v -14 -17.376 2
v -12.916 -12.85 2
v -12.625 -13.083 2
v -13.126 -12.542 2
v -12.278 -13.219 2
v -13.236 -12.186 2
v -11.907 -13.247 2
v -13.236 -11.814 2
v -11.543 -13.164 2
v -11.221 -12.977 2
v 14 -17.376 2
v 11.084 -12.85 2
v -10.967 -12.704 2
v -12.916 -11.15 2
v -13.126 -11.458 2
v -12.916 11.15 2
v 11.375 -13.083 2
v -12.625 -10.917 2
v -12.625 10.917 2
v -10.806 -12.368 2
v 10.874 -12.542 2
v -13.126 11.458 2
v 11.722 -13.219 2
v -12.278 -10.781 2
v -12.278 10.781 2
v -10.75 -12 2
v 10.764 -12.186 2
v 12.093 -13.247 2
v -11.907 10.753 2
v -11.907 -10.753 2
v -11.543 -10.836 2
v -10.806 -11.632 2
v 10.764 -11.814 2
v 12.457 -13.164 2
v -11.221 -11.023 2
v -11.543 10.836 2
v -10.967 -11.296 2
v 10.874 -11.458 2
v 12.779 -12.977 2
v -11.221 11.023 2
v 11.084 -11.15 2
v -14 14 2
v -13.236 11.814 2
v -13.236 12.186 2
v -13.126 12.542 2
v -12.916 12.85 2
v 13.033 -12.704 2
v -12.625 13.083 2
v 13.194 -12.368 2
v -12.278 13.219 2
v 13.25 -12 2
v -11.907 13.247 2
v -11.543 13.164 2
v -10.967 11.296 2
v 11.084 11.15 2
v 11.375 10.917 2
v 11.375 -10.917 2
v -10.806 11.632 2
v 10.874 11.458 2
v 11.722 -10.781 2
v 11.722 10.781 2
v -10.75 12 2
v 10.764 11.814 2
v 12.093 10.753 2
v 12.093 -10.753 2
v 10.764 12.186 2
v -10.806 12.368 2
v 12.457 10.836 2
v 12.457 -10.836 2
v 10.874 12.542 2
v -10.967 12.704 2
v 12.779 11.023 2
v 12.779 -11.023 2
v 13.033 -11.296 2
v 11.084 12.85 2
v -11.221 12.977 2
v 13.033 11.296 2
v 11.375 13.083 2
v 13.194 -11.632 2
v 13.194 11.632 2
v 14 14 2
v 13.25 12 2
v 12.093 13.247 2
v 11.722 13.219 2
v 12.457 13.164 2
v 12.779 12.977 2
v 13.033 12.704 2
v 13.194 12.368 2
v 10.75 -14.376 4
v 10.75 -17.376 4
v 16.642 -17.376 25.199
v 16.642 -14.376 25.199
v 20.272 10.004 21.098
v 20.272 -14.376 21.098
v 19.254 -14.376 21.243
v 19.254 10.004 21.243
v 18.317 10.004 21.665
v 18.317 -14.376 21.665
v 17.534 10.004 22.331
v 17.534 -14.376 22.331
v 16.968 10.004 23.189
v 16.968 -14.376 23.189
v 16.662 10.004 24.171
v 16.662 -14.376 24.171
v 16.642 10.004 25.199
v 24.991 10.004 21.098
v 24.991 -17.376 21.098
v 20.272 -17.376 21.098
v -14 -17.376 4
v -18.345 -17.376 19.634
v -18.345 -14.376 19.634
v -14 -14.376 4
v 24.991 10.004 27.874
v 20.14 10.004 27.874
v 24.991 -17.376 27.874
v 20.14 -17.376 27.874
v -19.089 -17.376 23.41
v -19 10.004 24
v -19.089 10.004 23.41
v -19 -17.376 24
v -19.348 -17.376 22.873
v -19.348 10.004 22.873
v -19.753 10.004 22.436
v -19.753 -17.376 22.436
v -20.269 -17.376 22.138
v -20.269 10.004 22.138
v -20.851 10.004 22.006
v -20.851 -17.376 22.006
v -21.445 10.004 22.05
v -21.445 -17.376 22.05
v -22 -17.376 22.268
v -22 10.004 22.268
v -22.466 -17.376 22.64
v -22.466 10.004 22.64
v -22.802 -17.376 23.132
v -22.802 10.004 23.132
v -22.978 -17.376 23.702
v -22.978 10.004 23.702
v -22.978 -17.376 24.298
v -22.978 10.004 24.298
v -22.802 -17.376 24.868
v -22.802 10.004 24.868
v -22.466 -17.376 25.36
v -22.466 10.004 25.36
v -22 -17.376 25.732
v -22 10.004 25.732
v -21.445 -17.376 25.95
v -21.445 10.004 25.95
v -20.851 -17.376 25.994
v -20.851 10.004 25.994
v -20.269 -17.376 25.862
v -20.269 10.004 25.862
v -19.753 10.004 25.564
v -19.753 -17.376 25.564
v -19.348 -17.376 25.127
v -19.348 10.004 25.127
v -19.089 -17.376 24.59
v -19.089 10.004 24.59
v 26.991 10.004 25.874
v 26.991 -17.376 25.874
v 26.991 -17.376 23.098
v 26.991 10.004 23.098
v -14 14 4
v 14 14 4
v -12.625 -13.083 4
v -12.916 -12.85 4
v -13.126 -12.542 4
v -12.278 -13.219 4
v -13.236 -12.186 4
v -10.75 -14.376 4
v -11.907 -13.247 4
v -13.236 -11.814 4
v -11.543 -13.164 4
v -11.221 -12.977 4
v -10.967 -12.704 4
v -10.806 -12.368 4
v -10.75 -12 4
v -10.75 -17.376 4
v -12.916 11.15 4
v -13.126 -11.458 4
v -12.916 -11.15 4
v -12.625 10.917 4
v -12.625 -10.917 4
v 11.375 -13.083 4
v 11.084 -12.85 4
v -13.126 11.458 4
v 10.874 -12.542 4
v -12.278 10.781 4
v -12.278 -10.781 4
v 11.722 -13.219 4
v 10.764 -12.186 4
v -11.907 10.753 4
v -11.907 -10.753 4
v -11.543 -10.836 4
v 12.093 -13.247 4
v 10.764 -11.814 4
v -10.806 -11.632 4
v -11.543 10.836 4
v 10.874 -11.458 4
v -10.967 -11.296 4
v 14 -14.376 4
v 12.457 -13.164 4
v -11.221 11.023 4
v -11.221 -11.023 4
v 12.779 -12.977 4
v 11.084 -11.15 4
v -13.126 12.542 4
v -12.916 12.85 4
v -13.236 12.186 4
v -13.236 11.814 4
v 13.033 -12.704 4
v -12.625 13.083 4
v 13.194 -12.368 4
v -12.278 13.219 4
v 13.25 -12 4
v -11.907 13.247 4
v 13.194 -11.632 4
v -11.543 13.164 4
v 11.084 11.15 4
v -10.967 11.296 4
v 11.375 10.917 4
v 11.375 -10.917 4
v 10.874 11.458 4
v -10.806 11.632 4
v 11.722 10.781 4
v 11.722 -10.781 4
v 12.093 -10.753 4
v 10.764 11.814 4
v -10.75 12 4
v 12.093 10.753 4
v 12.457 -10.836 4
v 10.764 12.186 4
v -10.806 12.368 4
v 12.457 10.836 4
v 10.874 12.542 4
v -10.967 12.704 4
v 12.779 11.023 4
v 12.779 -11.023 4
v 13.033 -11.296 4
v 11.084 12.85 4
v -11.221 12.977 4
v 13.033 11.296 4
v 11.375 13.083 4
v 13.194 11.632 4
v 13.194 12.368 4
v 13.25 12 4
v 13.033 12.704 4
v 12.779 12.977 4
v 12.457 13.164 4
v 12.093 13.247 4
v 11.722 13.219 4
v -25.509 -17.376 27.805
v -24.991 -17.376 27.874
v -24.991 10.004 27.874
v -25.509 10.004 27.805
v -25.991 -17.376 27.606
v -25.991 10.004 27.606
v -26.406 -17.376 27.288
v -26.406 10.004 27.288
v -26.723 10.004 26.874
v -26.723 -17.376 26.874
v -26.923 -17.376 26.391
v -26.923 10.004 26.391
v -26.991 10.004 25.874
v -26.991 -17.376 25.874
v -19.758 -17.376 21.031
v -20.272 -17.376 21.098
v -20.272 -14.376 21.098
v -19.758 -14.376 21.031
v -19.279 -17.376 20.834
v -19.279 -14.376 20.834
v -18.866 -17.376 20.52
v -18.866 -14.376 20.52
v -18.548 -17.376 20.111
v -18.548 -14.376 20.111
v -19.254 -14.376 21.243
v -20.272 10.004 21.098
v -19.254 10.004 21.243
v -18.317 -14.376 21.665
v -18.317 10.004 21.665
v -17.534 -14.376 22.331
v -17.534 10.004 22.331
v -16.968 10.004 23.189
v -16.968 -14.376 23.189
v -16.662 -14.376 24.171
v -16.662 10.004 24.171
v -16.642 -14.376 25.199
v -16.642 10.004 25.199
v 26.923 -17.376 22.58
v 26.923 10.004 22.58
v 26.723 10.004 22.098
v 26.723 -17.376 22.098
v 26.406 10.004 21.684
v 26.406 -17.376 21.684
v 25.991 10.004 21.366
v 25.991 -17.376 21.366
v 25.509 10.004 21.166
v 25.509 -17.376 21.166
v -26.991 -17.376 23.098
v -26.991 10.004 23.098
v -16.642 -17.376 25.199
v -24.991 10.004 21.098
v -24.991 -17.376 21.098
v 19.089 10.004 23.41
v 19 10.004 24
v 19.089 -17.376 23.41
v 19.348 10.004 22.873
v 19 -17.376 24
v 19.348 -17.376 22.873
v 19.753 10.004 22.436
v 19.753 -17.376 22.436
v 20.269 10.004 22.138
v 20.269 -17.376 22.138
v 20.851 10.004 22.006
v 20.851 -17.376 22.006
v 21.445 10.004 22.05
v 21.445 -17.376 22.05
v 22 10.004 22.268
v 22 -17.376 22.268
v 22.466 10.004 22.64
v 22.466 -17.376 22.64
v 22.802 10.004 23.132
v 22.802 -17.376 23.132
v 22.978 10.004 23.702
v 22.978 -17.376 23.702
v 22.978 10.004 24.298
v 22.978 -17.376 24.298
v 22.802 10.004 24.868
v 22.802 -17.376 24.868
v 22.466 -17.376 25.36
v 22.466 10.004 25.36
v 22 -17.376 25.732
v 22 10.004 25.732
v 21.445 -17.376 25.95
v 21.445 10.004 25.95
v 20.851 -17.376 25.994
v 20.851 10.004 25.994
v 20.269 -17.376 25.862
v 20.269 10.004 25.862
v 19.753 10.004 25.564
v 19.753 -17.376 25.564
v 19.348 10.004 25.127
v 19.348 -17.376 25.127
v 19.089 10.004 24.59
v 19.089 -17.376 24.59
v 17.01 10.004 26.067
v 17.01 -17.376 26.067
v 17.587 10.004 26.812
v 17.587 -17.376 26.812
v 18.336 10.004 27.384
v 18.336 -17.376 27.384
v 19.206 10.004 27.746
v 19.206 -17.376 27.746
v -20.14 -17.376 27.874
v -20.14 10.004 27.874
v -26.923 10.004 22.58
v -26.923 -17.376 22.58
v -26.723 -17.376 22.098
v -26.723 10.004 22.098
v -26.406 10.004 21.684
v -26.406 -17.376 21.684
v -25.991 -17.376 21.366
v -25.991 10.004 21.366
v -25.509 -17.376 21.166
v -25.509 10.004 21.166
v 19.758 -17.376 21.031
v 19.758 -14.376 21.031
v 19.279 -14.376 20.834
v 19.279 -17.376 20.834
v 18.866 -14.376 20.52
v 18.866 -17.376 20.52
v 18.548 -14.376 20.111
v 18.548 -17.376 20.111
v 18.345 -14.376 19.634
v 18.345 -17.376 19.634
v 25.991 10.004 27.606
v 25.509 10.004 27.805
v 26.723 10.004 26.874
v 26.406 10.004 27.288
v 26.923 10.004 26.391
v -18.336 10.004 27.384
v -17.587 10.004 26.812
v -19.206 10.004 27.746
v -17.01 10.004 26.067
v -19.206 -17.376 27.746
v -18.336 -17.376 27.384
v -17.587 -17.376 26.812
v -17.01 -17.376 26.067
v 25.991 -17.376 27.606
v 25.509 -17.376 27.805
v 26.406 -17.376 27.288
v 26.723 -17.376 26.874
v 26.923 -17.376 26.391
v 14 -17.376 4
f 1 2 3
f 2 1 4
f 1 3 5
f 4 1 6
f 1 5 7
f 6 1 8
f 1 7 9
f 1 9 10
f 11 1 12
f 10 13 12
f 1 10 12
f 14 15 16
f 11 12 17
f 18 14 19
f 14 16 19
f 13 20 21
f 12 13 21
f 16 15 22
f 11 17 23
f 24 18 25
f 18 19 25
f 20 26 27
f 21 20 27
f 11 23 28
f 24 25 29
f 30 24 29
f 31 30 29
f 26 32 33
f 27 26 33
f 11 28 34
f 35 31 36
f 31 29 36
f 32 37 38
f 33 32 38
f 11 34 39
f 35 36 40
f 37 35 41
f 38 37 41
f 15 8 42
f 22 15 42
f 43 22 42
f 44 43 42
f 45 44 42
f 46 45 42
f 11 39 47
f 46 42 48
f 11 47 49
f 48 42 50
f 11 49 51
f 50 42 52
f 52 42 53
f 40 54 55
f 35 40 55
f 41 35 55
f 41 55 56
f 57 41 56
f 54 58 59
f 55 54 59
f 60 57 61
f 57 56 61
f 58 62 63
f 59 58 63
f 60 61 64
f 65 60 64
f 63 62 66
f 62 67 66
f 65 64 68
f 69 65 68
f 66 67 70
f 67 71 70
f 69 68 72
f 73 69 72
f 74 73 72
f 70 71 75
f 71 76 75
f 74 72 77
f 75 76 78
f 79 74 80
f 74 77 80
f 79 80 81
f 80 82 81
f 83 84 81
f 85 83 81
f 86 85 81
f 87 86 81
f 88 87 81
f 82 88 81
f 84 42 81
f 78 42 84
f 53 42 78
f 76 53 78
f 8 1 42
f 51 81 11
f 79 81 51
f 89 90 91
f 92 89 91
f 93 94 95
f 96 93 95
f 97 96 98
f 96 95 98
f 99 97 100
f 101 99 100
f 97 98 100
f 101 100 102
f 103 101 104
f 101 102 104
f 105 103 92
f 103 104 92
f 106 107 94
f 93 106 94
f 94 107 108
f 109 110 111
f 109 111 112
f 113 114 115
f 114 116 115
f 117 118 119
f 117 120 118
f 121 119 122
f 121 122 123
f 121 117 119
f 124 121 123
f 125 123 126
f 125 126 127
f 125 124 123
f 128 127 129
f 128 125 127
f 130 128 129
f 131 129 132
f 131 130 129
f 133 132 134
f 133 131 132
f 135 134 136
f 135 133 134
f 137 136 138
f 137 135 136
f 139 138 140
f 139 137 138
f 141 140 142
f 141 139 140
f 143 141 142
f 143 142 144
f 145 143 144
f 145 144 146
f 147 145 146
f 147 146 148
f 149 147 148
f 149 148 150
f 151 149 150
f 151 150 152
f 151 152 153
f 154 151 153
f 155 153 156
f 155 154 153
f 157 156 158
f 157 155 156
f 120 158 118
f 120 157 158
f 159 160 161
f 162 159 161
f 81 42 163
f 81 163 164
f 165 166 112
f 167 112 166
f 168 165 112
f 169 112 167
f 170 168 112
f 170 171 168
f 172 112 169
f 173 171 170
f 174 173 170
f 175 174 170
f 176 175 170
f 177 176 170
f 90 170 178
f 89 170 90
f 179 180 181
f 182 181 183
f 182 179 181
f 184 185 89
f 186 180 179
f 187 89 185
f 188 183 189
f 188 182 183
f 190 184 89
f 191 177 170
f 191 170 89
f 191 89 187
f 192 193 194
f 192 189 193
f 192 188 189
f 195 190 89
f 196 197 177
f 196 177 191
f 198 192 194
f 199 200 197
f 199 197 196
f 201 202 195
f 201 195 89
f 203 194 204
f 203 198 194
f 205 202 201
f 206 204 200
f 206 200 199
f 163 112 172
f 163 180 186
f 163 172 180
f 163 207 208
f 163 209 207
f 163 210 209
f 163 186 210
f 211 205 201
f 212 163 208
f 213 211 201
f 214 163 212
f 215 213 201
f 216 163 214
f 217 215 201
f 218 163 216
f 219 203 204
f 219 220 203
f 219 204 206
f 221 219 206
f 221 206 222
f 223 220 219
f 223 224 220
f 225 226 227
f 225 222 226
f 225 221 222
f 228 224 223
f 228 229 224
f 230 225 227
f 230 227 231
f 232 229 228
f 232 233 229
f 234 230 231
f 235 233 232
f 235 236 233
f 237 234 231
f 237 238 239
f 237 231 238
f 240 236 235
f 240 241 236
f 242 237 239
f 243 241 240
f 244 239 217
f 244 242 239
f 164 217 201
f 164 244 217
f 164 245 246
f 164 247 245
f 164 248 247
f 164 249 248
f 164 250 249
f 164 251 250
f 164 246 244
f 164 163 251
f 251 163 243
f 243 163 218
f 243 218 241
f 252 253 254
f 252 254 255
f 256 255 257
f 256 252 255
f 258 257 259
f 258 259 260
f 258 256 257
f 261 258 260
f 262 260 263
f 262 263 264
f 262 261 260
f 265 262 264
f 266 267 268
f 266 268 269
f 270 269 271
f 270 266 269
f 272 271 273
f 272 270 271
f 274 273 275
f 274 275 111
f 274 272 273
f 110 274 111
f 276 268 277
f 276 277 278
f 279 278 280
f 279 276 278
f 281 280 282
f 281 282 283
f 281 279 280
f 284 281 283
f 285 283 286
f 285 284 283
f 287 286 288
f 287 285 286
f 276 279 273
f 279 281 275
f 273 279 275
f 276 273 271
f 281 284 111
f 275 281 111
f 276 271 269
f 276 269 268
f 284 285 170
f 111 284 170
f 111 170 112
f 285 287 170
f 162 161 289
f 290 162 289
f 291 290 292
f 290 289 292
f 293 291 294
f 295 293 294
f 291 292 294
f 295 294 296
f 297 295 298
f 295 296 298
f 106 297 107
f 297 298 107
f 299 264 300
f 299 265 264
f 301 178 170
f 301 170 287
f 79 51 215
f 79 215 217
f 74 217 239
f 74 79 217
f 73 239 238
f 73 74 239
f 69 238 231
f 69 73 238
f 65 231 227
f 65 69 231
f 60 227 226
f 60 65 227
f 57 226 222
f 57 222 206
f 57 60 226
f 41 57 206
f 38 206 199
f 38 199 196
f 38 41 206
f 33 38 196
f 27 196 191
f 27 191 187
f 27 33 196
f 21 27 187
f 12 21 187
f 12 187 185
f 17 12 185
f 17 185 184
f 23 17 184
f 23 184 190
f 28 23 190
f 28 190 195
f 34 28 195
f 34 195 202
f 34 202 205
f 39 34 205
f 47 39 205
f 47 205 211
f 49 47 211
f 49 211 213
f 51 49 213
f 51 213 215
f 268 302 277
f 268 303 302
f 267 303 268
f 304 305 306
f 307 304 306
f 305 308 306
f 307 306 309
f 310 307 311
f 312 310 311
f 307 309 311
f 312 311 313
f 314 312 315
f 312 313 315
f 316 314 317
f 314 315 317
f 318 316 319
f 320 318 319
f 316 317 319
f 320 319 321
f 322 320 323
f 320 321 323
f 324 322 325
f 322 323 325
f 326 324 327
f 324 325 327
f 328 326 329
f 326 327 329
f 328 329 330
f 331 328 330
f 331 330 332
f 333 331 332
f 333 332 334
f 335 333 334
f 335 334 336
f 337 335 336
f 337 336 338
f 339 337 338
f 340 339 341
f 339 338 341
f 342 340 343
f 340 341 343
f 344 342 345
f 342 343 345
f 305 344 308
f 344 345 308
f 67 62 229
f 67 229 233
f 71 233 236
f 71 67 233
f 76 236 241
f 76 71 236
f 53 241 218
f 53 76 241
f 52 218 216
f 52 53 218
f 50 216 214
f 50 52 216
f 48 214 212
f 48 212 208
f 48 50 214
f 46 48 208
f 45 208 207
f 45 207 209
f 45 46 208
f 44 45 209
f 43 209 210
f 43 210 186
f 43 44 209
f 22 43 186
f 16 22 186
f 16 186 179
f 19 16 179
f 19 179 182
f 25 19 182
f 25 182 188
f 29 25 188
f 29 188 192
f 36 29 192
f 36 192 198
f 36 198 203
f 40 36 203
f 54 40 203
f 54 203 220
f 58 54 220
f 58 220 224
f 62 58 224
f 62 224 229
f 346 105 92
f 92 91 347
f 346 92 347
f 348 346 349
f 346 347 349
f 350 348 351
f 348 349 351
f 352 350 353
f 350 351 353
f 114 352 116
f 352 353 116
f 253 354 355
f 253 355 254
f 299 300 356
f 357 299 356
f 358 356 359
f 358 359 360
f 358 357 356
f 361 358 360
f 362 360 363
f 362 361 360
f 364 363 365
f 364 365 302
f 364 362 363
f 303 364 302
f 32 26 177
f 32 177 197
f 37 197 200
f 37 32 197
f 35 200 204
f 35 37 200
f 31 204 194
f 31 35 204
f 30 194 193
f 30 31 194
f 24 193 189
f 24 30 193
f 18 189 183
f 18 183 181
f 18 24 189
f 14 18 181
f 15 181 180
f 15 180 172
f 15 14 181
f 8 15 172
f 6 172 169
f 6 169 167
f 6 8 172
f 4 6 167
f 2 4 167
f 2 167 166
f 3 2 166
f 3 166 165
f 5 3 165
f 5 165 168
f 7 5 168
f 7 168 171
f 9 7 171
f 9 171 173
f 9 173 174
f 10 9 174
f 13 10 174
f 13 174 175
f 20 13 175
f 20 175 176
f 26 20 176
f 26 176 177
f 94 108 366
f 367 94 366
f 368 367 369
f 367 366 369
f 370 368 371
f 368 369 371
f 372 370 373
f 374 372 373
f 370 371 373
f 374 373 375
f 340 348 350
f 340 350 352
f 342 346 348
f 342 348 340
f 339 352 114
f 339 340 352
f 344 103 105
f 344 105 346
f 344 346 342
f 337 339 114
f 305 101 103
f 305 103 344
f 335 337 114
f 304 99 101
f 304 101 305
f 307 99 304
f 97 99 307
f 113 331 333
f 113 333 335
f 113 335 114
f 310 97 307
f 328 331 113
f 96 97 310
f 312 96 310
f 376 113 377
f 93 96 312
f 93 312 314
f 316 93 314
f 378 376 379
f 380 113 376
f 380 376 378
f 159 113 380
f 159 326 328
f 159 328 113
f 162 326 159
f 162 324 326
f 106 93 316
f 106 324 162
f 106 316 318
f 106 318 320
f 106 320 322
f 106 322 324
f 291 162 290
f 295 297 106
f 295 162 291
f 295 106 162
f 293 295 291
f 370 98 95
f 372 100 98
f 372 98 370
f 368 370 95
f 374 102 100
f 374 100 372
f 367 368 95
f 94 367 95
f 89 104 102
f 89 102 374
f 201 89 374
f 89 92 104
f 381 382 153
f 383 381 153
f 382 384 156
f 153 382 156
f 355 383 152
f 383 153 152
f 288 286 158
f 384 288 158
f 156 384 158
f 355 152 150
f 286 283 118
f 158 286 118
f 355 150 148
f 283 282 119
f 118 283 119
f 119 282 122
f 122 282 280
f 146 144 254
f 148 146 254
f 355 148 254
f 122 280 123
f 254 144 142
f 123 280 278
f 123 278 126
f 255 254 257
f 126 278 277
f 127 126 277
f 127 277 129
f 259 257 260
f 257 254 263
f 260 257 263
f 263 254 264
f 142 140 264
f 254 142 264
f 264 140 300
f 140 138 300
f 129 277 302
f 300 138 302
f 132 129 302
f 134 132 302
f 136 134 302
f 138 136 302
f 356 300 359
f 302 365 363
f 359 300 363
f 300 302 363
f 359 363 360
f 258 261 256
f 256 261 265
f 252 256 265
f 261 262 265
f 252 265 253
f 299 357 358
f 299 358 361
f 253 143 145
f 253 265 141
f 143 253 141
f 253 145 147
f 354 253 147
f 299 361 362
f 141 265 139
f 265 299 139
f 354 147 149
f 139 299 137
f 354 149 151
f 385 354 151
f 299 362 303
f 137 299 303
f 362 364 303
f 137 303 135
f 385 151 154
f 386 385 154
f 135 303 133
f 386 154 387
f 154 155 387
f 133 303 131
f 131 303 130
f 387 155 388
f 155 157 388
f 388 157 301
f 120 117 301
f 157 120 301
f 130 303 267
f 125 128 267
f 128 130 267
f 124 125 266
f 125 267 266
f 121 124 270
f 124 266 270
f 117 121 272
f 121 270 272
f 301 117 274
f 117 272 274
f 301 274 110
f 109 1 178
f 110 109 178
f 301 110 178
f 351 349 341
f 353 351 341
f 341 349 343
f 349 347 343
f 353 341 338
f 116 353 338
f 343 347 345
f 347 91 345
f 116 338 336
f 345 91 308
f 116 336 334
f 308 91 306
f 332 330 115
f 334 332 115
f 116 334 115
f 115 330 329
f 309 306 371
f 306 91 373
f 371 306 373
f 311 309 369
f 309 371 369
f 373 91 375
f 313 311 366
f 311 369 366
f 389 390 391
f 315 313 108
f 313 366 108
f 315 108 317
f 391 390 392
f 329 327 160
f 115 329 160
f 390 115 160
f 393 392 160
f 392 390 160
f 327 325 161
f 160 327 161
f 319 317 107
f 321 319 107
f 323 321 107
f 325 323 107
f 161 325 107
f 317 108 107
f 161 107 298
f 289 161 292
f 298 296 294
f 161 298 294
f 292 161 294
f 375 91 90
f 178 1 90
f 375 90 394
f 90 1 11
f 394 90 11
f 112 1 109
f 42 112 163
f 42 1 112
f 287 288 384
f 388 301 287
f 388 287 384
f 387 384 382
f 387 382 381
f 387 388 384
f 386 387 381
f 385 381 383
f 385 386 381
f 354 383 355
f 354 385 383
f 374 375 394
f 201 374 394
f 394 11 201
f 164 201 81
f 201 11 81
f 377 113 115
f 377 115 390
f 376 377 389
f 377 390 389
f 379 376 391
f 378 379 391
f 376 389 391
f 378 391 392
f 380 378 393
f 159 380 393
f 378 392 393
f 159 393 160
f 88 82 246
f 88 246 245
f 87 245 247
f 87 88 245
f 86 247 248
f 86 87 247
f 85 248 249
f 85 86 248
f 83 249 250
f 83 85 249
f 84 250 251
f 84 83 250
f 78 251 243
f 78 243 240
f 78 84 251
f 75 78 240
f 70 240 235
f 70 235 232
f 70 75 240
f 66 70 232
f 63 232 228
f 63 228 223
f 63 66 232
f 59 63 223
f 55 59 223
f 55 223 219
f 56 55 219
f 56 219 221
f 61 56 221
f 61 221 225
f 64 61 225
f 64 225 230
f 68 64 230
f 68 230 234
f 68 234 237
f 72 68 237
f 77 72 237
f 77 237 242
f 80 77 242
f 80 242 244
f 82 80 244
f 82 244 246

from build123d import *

# Parameters (mm, degrees)
SKETCH_1_W          = 28
SKETCH_1_H          = 31.376198505
SKETCH_1_R          = 1.25
EXTRUDE_1_DEPTH     = 4
SKETCH_4_R          = 2
EXTRUDE_3_DEPTH     = 3
SKETCH_6_R          = 2
EXTRUDE_4_DEPTH     = 24.38
SKETCH_7_W          = 28
SKETCH_7_H          = 2
CUT_EXTRUDE_1_DEPTH = 72


with BuildPart() as part:
    # 草图1 → 凸台-拉伸1 (new body)
    with BuildSketch(Plane.XY):
        with Locations((0, -1.688099253)):
            Rectangle(SKETCH_1_W, SKETCH_1_H)
        with Locations((-12, -12)):
            Circle(SKETCH_1_R, mode=Mode.SUBTRACT)
        with Locations((-12, 12)):
            Circle(SKETCH_1_R, mode=Mode.SUBTRACT)
        with Locations((12, 12)):
            Circle(SKETCH_1_R, mode=Mode.SUBTRACT)
        with Locations((12, -12)):
            Circle(SKETCH_1_R, mode=Mode.SUBTRACT)
    extrude(amount=EXTRUDE_1_DEPTH)

    # 草图4 → 凸台-拉伸3 (add)
    with BuildSketch(Plane(origin=(0, -17.376198505, 0), x_dir=(1, 0, 0), z_dir=(0, 1, 0))):
        with BuildLine():
            Line((-10.75, -4), (-16.6423045, -25.198978267))
            ThreePointArc((-16.6423045, -25.198978267), (-17.942800458, -27.122401454), (-20.139772651, -27.873507091))
            Line((-20.139772651, -27.873507091), (-24.991319672, -27.873507091))
            ThreePointArc((-24.991319672, -27.873507091), (-26.405533234, -27.287720654), (-26.991319672, -25.873507091))
            Line((-26.991319672, -25.873507091), (-26.991319672, -23.098090883))
            ThreePointArc((-26.991319672, -23.098090883), (-26.405533234, -21.68387732), (-24.991319672, -21.098090883))
            Line((-24.991319672, -21.098090883), (-20.272369191, -21.098090883))
            ThreePointArc((-20.272369191, -21.098090883), (-19.062245191, -20.690447597), (-18.345420115, -19.633690786))
            Line((-18.345420115, -19.633690786), (-14, -4))
            Line((-14, -4), (-10.75, -4))
        make_face()
        with Locations((-21, -24)):
            Circle(SKETCH_4_R, mode=Mode.SUBTRACT)
    extrude_3 = extrude(amount=EXTRUDE_3_DEPTH)

    # 草图6 → 凸台-拉伸4 (add)
    with BuildSketch(Plane(origin=(0, -14.376198505, 0), x_dir=(1, 0, 0), z_dir=(0, 1, 0))):
        with BuildLine():
            ThreePointArc((-20.272369191, -21.098090883), (-17.534000745, -22.331206649), (-16.6423045, -25.198978267))
            ThreePointArc((-16.6423045, -25.198978267), (-17.942800458, -27.122401454), (-20.139772651, -27.873507091))
            Line((-20.139772651, -27.873507091), (-24.991319672, -27.873507091))
            ThreePointArc((-24.991319672, -27.873507091), (-26.405533234, -27.287720654), (-26.991319672, -25.873507091))
            Line((-26.991319672, -25.873507091), (-26.991319672, -23.098090883))
            ThreePointArc((-26.991319672, -23.098090883), (-26.405533234, -21.68387732), (-24.991319672, -21.098090883))
            Line((-24.991319672, -21.098090883), (-20.272369191, -21.098090883))
        make_face()
        with Locations((-21, -24)):
            Circle(SKETCH_6_R, mode=Mode.SUBTRACT)
    extrude_4 = extrude(amount=EXTRUDE_4_DEPTH)

    # 镜向1: 凸台-拉伸3, 凸台-拉伸4 across plane
    add(extrude_3.mirror(Plane(origin=(0, 0, 0), x_dir=(0, 0, 1), z_dir=(1, 0, 0))))
    add(extrude_4.mirror(Plane(origin=(0, 0, 0), x_dir=(0, 0, 1), z_dir=(1, 0, 0))))

    # 草图7 → 切除-拉伸1 (cut)
    with BuildSketch(Plane(origin=(0, 14, 0), x_dir=(1, 0, 0), z_dir=(0, 1, 0))):
        with Locations((0, -1)):
            Rectangle(SKETCH_7_W, SKETCH_7_H)
    extrude(amount=-CUT_EXTRUDE_1_DEPTH, mode=Mode.SUBTRACT)


solid = part.part
